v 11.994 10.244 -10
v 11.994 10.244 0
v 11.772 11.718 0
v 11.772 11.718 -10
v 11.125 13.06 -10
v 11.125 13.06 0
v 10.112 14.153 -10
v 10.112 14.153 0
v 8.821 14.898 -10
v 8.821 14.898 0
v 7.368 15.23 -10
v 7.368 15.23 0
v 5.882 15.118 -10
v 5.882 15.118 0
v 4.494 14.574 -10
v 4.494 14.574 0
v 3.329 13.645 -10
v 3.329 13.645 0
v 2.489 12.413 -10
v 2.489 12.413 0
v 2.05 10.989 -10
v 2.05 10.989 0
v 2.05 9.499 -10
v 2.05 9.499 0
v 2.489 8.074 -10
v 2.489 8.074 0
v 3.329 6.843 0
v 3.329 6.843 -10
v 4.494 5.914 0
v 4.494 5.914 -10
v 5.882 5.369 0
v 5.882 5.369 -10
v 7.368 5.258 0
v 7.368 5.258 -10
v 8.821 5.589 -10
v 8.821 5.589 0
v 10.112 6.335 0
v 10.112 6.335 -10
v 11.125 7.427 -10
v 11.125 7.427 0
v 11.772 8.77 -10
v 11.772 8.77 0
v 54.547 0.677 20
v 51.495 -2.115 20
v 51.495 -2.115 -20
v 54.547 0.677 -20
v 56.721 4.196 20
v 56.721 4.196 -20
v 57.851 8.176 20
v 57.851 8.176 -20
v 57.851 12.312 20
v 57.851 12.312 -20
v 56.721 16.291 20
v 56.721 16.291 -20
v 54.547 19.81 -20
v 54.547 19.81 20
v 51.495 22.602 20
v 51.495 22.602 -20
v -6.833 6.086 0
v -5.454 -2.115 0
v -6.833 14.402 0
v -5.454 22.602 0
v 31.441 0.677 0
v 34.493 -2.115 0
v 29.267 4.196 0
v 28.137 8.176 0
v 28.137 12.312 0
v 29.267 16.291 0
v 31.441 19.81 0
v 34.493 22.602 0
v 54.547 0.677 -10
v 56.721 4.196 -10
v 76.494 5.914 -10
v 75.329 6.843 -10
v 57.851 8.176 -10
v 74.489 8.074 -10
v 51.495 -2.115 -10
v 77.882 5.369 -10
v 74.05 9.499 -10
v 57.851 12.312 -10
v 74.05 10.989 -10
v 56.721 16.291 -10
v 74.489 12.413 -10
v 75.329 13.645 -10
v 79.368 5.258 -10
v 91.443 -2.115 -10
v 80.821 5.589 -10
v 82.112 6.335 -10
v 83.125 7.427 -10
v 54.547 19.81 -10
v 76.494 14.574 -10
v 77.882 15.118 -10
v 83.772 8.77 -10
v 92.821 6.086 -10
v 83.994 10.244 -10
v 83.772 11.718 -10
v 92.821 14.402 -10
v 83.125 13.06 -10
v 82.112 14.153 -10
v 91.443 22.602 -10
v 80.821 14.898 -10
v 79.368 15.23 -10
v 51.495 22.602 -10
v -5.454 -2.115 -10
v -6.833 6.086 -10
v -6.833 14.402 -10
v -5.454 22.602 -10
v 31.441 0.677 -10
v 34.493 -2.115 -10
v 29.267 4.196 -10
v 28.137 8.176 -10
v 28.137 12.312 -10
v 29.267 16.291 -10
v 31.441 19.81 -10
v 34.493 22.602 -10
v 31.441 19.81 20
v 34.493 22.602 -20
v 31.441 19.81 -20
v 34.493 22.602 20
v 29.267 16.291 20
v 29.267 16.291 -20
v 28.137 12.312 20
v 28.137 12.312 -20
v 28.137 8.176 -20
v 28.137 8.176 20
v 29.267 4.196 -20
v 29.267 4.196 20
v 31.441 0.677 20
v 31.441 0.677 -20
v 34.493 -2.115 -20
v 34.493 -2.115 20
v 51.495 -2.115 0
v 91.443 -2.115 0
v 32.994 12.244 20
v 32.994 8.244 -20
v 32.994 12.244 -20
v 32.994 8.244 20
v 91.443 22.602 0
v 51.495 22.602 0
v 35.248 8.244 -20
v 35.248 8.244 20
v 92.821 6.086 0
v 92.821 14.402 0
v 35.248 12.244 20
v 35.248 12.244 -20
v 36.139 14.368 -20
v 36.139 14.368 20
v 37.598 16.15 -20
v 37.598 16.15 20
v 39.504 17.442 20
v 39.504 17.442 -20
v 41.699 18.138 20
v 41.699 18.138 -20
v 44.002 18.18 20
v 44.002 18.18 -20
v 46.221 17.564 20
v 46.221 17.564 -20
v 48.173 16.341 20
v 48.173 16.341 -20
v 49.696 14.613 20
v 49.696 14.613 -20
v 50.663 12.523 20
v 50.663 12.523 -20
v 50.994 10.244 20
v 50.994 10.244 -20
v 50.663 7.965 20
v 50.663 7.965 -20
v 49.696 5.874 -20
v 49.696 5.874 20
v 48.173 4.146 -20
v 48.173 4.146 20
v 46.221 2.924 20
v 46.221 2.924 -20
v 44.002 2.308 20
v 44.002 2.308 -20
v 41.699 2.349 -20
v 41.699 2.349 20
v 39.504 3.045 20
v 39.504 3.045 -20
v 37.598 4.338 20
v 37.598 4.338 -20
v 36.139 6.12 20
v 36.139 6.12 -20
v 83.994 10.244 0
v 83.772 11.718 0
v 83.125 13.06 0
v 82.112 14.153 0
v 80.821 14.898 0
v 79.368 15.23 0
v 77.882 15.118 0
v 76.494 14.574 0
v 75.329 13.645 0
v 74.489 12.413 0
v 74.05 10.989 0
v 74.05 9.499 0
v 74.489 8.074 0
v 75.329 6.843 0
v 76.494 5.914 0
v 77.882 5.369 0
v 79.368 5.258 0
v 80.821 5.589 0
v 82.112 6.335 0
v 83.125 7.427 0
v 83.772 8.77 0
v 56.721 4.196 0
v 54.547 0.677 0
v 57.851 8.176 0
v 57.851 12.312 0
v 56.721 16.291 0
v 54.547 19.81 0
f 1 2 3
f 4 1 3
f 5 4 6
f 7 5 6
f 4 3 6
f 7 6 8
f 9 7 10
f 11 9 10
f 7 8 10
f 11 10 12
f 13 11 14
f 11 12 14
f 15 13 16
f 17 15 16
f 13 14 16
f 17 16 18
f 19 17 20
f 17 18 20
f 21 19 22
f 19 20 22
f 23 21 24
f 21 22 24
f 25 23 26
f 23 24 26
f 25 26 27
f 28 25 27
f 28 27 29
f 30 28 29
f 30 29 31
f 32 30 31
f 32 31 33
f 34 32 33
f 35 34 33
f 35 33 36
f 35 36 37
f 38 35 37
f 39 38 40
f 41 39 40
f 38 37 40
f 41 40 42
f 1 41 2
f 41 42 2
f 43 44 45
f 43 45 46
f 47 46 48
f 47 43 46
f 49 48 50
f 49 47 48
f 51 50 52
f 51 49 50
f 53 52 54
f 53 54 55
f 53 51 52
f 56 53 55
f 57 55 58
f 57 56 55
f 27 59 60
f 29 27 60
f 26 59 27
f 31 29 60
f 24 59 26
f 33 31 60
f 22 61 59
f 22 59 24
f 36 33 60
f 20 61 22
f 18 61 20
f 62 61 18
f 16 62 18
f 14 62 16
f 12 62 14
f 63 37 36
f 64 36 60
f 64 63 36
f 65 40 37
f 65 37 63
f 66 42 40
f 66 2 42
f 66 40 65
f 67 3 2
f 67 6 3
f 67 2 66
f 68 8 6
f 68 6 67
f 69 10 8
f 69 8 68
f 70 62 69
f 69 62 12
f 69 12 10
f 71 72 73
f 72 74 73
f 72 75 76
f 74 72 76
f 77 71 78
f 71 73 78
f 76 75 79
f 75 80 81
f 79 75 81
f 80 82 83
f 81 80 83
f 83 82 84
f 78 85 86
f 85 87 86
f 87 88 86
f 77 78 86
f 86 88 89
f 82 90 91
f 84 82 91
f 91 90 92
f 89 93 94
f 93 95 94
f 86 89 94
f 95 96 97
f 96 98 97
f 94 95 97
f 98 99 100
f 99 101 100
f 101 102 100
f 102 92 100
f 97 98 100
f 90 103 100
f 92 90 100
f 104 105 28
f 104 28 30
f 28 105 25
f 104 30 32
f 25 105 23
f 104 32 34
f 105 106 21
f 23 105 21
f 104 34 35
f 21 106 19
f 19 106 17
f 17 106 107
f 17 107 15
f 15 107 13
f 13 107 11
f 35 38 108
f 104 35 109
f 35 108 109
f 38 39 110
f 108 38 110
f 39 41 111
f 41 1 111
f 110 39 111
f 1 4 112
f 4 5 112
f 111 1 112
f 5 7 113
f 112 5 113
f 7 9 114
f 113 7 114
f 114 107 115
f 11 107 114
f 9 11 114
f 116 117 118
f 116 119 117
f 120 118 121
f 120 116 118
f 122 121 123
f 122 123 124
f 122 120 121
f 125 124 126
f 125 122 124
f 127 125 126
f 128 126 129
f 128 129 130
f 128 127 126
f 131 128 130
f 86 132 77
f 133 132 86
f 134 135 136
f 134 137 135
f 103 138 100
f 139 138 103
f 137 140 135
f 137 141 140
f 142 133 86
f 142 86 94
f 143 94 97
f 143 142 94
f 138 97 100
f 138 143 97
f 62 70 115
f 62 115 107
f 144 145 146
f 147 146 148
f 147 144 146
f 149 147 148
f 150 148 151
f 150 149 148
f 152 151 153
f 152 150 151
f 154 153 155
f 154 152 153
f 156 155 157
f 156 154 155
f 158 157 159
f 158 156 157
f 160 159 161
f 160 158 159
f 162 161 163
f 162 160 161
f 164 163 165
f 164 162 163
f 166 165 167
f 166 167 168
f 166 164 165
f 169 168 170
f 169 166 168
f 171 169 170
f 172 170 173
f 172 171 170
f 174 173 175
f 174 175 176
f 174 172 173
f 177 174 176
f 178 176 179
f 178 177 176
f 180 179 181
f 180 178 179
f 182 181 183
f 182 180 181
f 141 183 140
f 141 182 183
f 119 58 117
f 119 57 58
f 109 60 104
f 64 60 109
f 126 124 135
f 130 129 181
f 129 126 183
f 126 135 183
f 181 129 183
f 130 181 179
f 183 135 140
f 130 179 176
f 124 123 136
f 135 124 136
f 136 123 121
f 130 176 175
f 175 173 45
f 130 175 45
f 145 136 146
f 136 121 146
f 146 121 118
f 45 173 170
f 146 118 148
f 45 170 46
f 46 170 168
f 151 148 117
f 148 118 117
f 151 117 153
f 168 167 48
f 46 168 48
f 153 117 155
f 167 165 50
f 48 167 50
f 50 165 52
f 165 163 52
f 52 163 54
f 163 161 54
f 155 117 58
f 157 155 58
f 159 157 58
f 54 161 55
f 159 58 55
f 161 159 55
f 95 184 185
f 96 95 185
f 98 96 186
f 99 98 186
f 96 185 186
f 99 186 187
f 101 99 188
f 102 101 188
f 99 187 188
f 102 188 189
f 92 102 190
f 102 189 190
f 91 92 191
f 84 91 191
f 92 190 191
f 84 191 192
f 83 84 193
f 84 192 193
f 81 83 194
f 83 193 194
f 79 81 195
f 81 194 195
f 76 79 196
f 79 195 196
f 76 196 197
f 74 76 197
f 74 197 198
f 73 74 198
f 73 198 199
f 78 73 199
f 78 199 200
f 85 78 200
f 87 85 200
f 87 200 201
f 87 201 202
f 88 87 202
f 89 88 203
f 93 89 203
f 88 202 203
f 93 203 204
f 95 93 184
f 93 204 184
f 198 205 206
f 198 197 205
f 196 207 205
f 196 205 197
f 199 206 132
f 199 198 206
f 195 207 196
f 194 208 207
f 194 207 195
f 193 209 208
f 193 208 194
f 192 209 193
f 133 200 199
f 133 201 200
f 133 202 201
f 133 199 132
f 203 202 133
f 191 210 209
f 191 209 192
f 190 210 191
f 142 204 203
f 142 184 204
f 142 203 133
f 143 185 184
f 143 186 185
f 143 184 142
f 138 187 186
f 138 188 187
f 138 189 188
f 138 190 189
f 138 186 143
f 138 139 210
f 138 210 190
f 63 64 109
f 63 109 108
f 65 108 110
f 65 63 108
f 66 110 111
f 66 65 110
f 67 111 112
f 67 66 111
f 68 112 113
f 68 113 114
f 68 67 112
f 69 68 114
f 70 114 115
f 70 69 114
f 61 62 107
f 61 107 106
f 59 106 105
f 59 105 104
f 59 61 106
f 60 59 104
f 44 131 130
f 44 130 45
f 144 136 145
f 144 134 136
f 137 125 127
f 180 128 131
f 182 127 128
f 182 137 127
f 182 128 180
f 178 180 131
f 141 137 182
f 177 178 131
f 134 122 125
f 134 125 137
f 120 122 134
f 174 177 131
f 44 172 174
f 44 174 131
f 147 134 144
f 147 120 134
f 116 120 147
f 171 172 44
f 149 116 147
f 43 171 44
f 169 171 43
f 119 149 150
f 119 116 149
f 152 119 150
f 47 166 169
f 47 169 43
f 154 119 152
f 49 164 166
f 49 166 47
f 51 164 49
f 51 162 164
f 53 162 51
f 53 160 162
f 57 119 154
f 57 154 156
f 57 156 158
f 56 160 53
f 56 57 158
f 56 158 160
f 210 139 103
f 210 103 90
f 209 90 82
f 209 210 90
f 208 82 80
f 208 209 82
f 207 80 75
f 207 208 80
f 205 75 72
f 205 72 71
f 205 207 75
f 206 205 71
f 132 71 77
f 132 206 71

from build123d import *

# Parameters (mm, degrees)
F0_R     = 5
F1_DEPTH = 10
F2_DEPTH = 20


with BuildPart() as f1:
    # F0 (on Top) → F1 (new body)
    with BuildSketch(Plane.XY):
        with BuildLine():
            ThreePointArc((51.495306, 22.602154), (57.994143, 10.243747), (51.495306, -2.11466))
            Line((51.495306, -2.11466), (91.442773, -2.11466))
            ThreePointArc((91.442773, -2.11466), (92.994143, 10.243747), (91.442773, 22.602154))
            Line((91.442773, 22.602154), (51.495306, 22.602154))
        make_face()
        with Locations((78.994143, 10.243747)):
            Circle(F0_R, mode=Mode.SUBTRACT)
        with BuildLine():
            ThreePointArc((-5.454487, 22.602154), (-7.005857, 10.243747), (-5.454487, -2.11466))
            Line((-5.454487, -2.11466), (34.49298, -2.11466))
            ThreePointArc((34.49298, -2.11466), (27.994143, 10.243747), (34.49298, 22.602154))
            Line((34.49298, 22.602154), (-5.454487, 22.602154))
        make_face()
        with Locations((6.994143, 10.243747)):
            Circle(F0_R, mode=Mode.SUBTRACT)
    extrude(amount=-F1_DEPTH)


with BuildPart() as f2:
    # F0 (on Top) → F2 (new body, symmetric)
    with BuildSketch(Plane.XY):
        with BuildLine():
            ThreePointArc((34.49298, 22.602154), (27.994143, 10.243747), (34.49298, -2.11466))
            Line((34.49298, -2.11466), (51.495306, -2.11466))
            ThreePointArc((51.495306, -2.11466), (57.994143, 10.243747), (51.495306, 22.602154))
            Line((51.495306, 22.602154), (34.49298, 22.602154))
        make_face()
        with BuildLine():
            ThreePointArc((35.248176, 12.243747), (44.002177, 18.179984), (50.994143, 10.243747))
            ThreePointArc((50.994143, 10.243747), (44.002177, 2.307509), (35.248176, 8.243747))
            Line((35.248176, 8.243747), (32.994143, 8.243747))
            Line((32.994143, 8.243747), (32.994143, 12.243747))
            Line((32.994143, 12.243747), (35.248176, 12.243747))
        make_face(mode=Mode.SUBTRACT)
    extrude(amount=F2_DEPTH, both=True)


solid = Compound([f1.part, f2.part])
